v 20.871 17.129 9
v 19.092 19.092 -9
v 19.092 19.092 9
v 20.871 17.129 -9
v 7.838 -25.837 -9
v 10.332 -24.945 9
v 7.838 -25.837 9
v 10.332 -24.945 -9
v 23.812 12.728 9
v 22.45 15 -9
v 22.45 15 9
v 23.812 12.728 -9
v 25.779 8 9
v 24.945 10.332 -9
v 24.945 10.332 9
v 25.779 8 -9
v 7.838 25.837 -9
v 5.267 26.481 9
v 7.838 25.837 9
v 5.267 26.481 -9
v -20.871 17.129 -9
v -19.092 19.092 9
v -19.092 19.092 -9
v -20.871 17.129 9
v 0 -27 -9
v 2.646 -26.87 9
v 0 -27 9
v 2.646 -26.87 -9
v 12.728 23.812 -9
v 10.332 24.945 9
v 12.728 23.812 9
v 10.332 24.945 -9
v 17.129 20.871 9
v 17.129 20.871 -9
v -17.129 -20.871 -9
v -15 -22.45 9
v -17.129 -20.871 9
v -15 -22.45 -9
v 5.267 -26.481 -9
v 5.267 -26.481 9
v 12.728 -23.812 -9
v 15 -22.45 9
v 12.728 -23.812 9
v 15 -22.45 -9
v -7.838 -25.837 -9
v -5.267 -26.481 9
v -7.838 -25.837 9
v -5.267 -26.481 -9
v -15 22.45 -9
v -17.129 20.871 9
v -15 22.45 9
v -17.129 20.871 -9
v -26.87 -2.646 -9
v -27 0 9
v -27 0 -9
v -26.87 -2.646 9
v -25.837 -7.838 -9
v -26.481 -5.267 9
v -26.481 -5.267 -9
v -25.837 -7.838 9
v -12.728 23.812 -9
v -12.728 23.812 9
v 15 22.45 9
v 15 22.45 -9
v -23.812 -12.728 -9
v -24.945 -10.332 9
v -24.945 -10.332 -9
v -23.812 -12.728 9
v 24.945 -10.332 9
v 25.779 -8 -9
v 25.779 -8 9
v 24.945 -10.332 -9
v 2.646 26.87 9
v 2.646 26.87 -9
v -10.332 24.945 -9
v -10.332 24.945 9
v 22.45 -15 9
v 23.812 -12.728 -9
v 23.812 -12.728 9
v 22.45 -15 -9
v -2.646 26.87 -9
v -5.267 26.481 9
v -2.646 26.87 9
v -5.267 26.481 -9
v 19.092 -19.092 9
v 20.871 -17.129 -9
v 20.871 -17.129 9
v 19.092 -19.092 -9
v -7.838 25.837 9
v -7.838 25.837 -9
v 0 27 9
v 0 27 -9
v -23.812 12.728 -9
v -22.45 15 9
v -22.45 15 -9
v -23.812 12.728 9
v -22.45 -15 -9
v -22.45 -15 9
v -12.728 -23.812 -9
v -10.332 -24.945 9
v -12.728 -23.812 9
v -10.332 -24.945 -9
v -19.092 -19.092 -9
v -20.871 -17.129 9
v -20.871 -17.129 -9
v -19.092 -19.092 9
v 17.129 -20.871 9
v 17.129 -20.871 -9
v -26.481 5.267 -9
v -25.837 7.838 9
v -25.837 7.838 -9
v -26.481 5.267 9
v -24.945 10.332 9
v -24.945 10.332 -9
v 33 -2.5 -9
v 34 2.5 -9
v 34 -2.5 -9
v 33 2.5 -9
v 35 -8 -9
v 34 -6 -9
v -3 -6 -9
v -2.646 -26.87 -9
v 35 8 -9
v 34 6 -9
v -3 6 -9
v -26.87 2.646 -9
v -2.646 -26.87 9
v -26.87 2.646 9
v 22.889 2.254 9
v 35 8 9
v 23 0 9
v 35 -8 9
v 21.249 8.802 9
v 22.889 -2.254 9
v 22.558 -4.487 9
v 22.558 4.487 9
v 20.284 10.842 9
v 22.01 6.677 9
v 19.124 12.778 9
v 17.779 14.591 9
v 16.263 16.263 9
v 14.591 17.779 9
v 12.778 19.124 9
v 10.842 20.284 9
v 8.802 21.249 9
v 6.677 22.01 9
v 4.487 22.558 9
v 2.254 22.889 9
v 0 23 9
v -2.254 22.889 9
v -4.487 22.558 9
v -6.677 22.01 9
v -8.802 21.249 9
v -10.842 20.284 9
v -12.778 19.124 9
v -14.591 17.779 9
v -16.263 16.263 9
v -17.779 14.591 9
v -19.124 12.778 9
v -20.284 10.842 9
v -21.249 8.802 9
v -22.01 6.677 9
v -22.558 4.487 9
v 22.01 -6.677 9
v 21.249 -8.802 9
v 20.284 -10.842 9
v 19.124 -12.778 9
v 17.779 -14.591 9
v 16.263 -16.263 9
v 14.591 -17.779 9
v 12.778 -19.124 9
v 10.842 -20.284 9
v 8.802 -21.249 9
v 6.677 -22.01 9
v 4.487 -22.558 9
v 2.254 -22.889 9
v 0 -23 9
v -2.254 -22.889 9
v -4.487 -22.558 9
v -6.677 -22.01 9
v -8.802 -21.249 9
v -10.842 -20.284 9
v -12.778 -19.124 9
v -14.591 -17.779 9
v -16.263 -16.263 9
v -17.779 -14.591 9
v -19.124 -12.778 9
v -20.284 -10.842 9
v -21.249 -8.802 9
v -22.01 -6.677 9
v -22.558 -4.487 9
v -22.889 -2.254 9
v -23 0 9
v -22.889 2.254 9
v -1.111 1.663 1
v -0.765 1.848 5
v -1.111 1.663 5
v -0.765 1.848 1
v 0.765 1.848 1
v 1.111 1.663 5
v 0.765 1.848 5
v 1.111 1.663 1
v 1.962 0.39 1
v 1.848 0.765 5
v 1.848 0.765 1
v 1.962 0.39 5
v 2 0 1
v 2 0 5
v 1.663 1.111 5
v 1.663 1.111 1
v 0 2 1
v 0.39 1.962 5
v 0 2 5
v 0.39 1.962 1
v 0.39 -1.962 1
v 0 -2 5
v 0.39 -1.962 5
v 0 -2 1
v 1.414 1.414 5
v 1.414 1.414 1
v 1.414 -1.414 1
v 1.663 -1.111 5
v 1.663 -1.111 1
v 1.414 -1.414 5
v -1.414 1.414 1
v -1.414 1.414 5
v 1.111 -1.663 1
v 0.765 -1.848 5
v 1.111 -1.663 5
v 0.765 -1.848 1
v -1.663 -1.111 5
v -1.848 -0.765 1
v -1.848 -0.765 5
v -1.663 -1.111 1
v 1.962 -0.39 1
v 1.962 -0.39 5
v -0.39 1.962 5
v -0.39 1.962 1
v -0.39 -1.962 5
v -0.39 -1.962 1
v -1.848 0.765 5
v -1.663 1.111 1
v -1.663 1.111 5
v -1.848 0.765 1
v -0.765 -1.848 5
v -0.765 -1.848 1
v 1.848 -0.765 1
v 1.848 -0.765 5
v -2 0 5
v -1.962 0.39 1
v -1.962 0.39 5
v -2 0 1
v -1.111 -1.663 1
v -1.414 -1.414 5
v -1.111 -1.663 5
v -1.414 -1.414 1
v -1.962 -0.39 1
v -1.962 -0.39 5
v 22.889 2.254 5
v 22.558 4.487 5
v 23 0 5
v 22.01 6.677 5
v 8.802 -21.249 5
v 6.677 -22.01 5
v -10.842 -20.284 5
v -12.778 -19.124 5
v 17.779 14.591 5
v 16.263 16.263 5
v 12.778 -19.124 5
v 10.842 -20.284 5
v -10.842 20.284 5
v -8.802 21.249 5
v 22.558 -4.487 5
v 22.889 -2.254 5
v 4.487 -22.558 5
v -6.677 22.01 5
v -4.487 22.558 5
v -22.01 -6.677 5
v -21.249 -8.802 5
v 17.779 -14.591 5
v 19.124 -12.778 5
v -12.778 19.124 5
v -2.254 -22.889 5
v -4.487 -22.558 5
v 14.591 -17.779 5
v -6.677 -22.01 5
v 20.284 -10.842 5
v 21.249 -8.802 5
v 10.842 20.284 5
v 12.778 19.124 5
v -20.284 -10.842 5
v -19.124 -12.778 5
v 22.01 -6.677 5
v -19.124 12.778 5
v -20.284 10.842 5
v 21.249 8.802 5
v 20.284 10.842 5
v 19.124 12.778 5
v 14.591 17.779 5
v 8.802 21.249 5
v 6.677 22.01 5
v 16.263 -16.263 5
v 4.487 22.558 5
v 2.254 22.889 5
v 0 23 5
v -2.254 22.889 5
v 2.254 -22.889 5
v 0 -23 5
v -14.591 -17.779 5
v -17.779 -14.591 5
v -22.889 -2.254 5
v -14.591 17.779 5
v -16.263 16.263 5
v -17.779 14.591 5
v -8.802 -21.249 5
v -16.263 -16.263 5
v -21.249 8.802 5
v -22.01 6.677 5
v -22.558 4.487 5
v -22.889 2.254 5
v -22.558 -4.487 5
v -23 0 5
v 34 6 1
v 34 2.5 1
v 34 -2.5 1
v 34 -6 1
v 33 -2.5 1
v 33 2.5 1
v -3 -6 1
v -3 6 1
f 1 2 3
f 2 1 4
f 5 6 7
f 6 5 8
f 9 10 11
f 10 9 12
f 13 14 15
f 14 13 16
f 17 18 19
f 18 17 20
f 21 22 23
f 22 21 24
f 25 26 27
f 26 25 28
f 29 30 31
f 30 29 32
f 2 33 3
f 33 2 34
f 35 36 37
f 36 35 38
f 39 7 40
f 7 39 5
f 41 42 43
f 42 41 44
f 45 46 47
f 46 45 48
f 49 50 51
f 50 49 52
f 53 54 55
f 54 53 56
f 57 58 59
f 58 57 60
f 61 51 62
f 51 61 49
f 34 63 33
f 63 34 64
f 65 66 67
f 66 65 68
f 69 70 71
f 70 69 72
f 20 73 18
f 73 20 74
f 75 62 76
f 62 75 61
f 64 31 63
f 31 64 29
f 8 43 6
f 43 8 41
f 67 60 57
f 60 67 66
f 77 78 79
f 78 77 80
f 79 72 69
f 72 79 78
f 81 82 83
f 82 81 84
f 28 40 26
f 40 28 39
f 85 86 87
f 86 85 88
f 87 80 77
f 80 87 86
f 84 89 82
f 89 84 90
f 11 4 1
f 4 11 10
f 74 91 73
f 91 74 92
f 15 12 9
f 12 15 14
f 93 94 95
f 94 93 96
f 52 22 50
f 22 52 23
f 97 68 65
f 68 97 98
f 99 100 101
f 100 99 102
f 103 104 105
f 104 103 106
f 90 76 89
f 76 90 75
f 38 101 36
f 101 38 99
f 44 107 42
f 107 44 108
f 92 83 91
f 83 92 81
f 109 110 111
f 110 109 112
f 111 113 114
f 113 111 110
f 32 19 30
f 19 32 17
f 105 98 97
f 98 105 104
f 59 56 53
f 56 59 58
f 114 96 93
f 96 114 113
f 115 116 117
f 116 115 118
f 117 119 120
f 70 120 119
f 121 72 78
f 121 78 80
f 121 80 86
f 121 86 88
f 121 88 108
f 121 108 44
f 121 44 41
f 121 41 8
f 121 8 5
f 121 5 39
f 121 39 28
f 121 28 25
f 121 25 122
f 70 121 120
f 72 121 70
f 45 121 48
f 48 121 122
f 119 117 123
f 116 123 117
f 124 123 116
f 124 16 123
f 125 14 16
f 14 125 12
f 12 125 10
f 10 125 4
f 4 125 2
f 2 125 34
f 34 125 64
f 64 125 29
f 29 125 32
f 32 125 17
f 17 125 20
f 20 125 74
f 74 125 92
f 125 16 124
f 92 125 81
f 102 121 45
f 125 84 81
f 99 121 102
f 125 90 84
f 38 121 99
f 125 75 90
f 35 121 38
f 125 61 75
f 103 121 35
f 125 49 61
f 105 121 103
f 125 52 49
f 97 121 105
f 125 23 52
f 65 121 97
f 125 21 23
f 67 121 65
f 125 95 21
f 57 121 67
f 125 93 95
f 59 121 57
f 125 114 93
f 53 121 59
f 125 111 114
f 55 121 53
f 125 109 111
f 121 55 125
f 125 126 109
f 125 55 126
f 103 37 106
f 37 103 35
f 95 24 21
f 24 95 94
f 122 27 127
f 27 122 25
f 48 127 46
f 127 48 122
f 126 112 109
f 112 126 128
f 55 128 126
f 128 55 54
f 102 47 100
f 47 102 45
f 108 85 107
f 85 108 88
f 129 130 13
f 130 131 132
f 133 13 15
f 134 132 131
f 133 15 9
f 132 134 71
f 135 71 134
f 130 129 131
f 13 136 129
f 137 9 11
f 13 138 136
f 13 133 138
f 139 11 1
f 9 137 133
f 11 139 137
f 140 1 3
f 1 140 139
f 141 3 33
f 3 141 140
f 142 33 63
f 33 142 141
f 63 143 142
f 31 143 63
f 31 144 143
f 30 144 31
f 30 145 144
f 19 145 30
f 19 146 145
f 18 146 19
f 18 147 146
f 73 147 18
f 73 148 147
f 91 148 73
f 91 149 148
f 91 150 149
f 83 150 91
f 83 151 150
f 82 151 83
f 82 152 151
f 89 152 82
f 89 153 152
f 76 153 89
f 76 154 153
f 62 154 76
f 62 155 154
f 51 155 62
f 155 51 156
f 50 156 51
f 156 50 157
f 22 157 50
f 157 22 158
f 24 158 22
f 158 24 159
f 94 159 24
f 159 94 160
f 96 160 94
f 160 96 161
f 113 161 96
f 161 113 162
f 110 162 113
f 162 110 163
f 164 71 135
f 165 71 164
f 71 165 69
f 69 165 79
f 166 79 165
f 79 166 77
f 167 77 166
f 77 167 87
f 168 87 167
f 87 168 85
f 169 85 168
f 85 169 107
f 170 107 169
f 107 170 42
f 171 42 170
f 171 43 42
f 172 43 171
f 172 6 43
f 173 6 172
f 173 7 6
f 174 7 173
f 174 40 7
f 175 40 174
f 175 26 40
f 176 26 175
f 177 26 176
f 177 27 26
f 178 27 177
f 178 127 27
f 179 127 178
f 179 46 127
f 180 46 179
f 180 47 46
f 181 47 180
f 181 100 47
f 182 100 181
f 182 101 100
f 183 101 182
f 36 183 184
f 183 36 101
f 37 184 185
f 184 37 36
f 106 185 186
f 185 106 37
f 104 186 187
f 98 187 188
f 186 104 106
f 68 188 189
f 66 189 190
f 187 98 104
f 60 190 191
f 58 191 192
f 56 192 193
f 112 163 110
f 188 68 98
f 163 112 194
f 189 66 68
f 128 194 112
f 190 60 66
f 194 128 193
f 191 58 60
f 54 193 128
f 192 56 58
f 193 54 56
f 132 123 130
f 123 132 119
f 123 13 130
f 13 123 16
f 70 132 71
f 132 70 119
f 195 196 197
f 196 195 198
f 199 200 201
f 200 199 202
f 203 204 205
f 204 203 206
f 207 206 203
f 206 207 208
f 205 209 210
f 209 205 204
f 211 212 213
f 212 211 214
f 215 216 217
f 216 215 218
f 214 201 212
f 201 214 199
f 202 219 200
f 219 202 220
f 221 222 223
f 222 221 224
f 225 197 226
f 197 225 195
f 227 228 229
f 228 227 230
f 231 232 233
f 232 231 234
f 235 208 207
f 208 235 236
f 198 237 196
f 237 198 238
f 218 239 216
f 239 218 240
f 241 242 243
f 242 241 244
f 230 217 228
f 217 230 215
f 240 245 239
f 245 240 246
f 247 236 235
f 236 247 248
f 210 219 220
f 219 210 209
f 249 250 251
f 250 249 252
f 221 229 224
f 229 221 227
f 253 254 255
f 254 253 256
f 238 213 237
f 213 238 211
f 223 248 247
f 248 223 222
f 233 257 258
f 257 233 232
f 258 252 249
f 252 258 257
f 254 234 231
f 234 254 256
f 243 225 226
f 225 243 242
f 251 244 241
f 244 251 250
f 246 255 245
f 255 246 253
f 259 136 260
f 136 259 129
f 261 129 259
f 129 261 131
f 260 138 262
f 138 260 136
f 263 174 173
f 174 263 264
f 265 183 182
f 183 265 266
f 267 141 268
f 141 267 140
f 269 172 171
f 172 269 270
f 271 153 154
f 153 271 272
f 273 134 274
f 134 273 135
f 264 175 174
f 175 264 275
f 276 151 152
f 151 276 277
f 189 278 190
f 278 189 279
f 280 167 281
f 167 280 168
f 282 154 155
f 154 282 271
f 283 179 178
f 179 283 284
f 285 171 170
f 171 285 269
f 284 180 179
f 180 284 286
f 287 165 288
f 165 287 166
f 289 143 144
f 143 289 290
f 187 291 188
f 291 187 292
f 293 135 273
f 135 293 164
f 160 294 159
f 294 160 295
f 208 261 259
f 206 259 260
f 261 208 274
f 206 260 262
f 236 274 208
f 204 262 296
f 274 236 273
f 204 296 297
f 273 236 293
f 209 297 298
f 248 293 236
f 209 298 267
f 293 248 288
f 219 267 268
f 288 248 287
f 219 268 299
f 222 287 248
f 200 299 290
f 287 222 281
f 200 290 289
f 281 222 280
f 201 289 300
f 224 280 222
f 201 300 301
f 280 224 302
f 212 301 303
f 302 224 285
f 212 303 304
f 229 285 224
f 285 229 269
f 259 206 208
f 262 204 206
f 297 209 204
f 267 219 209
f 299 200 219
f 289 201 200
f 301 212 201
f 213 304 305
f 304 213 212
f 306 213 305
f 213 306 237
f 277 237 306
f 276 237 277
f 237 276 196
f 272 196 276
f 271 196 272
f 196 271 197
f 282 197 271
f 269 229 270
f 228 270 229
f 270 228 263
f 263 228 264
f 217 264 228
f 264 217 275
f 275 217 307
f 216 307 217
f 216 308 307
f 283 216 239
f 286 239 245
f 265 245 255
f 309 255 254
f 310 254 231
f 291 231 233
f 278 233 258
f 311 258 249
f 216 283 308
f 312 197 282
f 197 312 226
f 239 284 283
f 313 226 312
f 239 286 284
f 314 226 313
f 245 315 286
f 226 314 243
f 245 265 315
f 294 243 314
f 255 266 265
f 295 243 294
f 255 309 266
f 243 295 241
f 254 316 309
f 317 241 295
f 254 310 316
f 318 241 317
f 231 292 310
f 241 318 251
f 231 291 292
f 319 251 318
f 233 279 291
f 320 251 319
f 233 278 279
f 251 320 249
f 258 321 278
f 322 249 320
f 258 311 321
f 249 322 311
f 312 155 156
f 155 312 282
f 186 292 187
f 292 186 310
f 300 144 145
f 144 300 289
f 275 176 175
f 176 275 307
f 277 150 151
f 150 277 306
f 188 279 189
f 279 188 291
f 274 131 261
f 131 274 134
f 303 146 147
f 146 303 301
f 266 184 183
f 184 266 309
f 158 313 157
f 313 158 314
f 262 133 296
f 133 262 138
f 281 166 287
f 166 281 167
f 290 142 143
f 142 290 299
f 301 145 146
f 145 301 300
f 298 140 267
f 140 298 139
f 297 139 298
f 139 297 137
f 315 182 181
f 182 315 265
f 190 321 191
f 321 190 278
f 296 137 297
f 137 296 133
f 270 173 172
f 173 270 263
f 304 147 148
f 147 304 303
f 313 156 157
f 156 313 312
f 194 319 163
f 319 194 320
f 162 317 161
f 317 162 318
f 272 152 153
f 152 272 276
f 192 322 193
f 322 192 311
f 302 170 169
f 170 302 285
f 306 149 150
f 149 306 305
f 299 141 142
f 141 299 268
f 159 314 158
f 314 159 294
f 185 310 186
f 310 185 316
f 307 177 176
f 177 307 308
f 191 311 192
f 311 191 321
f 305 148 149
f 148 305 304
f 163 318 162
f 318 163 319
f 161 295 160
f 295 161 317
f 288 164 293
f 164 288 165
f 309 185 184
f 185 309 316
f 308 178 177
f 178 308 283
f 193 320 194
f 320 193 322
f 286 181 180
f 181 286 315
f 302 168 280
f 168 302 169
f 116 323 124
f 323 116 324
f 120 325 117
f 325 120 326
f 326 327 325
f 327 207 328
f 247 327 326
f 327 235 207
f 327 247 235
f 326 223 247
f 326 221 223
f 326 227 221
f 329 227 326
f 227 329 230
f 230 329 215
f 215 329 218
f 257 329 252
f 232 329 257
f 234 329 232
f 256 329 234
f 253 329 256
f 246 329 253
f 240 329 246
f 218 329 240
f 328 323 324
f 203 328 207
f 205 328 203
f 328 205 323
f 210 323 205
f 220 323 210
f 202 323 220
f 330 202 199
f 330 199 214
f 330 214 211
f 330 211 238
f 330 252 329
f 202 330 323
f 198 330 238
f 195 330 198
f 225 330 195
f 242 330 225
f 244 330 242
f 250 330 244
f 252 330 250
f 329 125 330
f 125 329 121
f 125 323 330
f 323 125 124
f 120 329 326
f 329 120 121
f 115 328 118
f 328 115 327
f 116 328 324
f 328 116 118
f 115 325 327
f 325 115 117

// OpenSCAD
WIDTH = 33;
LENGTH = 40; 
HEIGHT = 2;

$fn = 32;

module disk() {
    translate([3, 0, 0])cube([4,4,3], center=true);
    difference() {
        cylinder($fn=64, r=22, h=3, center=true);
        cylinder(r=1.5, h=5, center=true);
        translate([0,11.5,1]) cube(size=[3, 19, 3], center=true);
        translate([0,-11.5,1]) cube(size=[3, 19, 3], center=true);
    }
}

module  base() {
    difference() {
        union() {
            cylinder($fn=64, r=27, h=18, center=true);
            translate([17.5,0,0]) cube([35,16,18], center=true);
        }
        cylinder(r=2, h=20, center=true);

        translate([0,0,9])cylinder($fn=64, r=23, h=8, center=true);
        translate([15.5,0,-4])cube(size=[37, 12, 10], center=true);

    }
    translate([34,0,-4])cube(size=[2, 5, 10], center=true);
}

//disk();
base();
